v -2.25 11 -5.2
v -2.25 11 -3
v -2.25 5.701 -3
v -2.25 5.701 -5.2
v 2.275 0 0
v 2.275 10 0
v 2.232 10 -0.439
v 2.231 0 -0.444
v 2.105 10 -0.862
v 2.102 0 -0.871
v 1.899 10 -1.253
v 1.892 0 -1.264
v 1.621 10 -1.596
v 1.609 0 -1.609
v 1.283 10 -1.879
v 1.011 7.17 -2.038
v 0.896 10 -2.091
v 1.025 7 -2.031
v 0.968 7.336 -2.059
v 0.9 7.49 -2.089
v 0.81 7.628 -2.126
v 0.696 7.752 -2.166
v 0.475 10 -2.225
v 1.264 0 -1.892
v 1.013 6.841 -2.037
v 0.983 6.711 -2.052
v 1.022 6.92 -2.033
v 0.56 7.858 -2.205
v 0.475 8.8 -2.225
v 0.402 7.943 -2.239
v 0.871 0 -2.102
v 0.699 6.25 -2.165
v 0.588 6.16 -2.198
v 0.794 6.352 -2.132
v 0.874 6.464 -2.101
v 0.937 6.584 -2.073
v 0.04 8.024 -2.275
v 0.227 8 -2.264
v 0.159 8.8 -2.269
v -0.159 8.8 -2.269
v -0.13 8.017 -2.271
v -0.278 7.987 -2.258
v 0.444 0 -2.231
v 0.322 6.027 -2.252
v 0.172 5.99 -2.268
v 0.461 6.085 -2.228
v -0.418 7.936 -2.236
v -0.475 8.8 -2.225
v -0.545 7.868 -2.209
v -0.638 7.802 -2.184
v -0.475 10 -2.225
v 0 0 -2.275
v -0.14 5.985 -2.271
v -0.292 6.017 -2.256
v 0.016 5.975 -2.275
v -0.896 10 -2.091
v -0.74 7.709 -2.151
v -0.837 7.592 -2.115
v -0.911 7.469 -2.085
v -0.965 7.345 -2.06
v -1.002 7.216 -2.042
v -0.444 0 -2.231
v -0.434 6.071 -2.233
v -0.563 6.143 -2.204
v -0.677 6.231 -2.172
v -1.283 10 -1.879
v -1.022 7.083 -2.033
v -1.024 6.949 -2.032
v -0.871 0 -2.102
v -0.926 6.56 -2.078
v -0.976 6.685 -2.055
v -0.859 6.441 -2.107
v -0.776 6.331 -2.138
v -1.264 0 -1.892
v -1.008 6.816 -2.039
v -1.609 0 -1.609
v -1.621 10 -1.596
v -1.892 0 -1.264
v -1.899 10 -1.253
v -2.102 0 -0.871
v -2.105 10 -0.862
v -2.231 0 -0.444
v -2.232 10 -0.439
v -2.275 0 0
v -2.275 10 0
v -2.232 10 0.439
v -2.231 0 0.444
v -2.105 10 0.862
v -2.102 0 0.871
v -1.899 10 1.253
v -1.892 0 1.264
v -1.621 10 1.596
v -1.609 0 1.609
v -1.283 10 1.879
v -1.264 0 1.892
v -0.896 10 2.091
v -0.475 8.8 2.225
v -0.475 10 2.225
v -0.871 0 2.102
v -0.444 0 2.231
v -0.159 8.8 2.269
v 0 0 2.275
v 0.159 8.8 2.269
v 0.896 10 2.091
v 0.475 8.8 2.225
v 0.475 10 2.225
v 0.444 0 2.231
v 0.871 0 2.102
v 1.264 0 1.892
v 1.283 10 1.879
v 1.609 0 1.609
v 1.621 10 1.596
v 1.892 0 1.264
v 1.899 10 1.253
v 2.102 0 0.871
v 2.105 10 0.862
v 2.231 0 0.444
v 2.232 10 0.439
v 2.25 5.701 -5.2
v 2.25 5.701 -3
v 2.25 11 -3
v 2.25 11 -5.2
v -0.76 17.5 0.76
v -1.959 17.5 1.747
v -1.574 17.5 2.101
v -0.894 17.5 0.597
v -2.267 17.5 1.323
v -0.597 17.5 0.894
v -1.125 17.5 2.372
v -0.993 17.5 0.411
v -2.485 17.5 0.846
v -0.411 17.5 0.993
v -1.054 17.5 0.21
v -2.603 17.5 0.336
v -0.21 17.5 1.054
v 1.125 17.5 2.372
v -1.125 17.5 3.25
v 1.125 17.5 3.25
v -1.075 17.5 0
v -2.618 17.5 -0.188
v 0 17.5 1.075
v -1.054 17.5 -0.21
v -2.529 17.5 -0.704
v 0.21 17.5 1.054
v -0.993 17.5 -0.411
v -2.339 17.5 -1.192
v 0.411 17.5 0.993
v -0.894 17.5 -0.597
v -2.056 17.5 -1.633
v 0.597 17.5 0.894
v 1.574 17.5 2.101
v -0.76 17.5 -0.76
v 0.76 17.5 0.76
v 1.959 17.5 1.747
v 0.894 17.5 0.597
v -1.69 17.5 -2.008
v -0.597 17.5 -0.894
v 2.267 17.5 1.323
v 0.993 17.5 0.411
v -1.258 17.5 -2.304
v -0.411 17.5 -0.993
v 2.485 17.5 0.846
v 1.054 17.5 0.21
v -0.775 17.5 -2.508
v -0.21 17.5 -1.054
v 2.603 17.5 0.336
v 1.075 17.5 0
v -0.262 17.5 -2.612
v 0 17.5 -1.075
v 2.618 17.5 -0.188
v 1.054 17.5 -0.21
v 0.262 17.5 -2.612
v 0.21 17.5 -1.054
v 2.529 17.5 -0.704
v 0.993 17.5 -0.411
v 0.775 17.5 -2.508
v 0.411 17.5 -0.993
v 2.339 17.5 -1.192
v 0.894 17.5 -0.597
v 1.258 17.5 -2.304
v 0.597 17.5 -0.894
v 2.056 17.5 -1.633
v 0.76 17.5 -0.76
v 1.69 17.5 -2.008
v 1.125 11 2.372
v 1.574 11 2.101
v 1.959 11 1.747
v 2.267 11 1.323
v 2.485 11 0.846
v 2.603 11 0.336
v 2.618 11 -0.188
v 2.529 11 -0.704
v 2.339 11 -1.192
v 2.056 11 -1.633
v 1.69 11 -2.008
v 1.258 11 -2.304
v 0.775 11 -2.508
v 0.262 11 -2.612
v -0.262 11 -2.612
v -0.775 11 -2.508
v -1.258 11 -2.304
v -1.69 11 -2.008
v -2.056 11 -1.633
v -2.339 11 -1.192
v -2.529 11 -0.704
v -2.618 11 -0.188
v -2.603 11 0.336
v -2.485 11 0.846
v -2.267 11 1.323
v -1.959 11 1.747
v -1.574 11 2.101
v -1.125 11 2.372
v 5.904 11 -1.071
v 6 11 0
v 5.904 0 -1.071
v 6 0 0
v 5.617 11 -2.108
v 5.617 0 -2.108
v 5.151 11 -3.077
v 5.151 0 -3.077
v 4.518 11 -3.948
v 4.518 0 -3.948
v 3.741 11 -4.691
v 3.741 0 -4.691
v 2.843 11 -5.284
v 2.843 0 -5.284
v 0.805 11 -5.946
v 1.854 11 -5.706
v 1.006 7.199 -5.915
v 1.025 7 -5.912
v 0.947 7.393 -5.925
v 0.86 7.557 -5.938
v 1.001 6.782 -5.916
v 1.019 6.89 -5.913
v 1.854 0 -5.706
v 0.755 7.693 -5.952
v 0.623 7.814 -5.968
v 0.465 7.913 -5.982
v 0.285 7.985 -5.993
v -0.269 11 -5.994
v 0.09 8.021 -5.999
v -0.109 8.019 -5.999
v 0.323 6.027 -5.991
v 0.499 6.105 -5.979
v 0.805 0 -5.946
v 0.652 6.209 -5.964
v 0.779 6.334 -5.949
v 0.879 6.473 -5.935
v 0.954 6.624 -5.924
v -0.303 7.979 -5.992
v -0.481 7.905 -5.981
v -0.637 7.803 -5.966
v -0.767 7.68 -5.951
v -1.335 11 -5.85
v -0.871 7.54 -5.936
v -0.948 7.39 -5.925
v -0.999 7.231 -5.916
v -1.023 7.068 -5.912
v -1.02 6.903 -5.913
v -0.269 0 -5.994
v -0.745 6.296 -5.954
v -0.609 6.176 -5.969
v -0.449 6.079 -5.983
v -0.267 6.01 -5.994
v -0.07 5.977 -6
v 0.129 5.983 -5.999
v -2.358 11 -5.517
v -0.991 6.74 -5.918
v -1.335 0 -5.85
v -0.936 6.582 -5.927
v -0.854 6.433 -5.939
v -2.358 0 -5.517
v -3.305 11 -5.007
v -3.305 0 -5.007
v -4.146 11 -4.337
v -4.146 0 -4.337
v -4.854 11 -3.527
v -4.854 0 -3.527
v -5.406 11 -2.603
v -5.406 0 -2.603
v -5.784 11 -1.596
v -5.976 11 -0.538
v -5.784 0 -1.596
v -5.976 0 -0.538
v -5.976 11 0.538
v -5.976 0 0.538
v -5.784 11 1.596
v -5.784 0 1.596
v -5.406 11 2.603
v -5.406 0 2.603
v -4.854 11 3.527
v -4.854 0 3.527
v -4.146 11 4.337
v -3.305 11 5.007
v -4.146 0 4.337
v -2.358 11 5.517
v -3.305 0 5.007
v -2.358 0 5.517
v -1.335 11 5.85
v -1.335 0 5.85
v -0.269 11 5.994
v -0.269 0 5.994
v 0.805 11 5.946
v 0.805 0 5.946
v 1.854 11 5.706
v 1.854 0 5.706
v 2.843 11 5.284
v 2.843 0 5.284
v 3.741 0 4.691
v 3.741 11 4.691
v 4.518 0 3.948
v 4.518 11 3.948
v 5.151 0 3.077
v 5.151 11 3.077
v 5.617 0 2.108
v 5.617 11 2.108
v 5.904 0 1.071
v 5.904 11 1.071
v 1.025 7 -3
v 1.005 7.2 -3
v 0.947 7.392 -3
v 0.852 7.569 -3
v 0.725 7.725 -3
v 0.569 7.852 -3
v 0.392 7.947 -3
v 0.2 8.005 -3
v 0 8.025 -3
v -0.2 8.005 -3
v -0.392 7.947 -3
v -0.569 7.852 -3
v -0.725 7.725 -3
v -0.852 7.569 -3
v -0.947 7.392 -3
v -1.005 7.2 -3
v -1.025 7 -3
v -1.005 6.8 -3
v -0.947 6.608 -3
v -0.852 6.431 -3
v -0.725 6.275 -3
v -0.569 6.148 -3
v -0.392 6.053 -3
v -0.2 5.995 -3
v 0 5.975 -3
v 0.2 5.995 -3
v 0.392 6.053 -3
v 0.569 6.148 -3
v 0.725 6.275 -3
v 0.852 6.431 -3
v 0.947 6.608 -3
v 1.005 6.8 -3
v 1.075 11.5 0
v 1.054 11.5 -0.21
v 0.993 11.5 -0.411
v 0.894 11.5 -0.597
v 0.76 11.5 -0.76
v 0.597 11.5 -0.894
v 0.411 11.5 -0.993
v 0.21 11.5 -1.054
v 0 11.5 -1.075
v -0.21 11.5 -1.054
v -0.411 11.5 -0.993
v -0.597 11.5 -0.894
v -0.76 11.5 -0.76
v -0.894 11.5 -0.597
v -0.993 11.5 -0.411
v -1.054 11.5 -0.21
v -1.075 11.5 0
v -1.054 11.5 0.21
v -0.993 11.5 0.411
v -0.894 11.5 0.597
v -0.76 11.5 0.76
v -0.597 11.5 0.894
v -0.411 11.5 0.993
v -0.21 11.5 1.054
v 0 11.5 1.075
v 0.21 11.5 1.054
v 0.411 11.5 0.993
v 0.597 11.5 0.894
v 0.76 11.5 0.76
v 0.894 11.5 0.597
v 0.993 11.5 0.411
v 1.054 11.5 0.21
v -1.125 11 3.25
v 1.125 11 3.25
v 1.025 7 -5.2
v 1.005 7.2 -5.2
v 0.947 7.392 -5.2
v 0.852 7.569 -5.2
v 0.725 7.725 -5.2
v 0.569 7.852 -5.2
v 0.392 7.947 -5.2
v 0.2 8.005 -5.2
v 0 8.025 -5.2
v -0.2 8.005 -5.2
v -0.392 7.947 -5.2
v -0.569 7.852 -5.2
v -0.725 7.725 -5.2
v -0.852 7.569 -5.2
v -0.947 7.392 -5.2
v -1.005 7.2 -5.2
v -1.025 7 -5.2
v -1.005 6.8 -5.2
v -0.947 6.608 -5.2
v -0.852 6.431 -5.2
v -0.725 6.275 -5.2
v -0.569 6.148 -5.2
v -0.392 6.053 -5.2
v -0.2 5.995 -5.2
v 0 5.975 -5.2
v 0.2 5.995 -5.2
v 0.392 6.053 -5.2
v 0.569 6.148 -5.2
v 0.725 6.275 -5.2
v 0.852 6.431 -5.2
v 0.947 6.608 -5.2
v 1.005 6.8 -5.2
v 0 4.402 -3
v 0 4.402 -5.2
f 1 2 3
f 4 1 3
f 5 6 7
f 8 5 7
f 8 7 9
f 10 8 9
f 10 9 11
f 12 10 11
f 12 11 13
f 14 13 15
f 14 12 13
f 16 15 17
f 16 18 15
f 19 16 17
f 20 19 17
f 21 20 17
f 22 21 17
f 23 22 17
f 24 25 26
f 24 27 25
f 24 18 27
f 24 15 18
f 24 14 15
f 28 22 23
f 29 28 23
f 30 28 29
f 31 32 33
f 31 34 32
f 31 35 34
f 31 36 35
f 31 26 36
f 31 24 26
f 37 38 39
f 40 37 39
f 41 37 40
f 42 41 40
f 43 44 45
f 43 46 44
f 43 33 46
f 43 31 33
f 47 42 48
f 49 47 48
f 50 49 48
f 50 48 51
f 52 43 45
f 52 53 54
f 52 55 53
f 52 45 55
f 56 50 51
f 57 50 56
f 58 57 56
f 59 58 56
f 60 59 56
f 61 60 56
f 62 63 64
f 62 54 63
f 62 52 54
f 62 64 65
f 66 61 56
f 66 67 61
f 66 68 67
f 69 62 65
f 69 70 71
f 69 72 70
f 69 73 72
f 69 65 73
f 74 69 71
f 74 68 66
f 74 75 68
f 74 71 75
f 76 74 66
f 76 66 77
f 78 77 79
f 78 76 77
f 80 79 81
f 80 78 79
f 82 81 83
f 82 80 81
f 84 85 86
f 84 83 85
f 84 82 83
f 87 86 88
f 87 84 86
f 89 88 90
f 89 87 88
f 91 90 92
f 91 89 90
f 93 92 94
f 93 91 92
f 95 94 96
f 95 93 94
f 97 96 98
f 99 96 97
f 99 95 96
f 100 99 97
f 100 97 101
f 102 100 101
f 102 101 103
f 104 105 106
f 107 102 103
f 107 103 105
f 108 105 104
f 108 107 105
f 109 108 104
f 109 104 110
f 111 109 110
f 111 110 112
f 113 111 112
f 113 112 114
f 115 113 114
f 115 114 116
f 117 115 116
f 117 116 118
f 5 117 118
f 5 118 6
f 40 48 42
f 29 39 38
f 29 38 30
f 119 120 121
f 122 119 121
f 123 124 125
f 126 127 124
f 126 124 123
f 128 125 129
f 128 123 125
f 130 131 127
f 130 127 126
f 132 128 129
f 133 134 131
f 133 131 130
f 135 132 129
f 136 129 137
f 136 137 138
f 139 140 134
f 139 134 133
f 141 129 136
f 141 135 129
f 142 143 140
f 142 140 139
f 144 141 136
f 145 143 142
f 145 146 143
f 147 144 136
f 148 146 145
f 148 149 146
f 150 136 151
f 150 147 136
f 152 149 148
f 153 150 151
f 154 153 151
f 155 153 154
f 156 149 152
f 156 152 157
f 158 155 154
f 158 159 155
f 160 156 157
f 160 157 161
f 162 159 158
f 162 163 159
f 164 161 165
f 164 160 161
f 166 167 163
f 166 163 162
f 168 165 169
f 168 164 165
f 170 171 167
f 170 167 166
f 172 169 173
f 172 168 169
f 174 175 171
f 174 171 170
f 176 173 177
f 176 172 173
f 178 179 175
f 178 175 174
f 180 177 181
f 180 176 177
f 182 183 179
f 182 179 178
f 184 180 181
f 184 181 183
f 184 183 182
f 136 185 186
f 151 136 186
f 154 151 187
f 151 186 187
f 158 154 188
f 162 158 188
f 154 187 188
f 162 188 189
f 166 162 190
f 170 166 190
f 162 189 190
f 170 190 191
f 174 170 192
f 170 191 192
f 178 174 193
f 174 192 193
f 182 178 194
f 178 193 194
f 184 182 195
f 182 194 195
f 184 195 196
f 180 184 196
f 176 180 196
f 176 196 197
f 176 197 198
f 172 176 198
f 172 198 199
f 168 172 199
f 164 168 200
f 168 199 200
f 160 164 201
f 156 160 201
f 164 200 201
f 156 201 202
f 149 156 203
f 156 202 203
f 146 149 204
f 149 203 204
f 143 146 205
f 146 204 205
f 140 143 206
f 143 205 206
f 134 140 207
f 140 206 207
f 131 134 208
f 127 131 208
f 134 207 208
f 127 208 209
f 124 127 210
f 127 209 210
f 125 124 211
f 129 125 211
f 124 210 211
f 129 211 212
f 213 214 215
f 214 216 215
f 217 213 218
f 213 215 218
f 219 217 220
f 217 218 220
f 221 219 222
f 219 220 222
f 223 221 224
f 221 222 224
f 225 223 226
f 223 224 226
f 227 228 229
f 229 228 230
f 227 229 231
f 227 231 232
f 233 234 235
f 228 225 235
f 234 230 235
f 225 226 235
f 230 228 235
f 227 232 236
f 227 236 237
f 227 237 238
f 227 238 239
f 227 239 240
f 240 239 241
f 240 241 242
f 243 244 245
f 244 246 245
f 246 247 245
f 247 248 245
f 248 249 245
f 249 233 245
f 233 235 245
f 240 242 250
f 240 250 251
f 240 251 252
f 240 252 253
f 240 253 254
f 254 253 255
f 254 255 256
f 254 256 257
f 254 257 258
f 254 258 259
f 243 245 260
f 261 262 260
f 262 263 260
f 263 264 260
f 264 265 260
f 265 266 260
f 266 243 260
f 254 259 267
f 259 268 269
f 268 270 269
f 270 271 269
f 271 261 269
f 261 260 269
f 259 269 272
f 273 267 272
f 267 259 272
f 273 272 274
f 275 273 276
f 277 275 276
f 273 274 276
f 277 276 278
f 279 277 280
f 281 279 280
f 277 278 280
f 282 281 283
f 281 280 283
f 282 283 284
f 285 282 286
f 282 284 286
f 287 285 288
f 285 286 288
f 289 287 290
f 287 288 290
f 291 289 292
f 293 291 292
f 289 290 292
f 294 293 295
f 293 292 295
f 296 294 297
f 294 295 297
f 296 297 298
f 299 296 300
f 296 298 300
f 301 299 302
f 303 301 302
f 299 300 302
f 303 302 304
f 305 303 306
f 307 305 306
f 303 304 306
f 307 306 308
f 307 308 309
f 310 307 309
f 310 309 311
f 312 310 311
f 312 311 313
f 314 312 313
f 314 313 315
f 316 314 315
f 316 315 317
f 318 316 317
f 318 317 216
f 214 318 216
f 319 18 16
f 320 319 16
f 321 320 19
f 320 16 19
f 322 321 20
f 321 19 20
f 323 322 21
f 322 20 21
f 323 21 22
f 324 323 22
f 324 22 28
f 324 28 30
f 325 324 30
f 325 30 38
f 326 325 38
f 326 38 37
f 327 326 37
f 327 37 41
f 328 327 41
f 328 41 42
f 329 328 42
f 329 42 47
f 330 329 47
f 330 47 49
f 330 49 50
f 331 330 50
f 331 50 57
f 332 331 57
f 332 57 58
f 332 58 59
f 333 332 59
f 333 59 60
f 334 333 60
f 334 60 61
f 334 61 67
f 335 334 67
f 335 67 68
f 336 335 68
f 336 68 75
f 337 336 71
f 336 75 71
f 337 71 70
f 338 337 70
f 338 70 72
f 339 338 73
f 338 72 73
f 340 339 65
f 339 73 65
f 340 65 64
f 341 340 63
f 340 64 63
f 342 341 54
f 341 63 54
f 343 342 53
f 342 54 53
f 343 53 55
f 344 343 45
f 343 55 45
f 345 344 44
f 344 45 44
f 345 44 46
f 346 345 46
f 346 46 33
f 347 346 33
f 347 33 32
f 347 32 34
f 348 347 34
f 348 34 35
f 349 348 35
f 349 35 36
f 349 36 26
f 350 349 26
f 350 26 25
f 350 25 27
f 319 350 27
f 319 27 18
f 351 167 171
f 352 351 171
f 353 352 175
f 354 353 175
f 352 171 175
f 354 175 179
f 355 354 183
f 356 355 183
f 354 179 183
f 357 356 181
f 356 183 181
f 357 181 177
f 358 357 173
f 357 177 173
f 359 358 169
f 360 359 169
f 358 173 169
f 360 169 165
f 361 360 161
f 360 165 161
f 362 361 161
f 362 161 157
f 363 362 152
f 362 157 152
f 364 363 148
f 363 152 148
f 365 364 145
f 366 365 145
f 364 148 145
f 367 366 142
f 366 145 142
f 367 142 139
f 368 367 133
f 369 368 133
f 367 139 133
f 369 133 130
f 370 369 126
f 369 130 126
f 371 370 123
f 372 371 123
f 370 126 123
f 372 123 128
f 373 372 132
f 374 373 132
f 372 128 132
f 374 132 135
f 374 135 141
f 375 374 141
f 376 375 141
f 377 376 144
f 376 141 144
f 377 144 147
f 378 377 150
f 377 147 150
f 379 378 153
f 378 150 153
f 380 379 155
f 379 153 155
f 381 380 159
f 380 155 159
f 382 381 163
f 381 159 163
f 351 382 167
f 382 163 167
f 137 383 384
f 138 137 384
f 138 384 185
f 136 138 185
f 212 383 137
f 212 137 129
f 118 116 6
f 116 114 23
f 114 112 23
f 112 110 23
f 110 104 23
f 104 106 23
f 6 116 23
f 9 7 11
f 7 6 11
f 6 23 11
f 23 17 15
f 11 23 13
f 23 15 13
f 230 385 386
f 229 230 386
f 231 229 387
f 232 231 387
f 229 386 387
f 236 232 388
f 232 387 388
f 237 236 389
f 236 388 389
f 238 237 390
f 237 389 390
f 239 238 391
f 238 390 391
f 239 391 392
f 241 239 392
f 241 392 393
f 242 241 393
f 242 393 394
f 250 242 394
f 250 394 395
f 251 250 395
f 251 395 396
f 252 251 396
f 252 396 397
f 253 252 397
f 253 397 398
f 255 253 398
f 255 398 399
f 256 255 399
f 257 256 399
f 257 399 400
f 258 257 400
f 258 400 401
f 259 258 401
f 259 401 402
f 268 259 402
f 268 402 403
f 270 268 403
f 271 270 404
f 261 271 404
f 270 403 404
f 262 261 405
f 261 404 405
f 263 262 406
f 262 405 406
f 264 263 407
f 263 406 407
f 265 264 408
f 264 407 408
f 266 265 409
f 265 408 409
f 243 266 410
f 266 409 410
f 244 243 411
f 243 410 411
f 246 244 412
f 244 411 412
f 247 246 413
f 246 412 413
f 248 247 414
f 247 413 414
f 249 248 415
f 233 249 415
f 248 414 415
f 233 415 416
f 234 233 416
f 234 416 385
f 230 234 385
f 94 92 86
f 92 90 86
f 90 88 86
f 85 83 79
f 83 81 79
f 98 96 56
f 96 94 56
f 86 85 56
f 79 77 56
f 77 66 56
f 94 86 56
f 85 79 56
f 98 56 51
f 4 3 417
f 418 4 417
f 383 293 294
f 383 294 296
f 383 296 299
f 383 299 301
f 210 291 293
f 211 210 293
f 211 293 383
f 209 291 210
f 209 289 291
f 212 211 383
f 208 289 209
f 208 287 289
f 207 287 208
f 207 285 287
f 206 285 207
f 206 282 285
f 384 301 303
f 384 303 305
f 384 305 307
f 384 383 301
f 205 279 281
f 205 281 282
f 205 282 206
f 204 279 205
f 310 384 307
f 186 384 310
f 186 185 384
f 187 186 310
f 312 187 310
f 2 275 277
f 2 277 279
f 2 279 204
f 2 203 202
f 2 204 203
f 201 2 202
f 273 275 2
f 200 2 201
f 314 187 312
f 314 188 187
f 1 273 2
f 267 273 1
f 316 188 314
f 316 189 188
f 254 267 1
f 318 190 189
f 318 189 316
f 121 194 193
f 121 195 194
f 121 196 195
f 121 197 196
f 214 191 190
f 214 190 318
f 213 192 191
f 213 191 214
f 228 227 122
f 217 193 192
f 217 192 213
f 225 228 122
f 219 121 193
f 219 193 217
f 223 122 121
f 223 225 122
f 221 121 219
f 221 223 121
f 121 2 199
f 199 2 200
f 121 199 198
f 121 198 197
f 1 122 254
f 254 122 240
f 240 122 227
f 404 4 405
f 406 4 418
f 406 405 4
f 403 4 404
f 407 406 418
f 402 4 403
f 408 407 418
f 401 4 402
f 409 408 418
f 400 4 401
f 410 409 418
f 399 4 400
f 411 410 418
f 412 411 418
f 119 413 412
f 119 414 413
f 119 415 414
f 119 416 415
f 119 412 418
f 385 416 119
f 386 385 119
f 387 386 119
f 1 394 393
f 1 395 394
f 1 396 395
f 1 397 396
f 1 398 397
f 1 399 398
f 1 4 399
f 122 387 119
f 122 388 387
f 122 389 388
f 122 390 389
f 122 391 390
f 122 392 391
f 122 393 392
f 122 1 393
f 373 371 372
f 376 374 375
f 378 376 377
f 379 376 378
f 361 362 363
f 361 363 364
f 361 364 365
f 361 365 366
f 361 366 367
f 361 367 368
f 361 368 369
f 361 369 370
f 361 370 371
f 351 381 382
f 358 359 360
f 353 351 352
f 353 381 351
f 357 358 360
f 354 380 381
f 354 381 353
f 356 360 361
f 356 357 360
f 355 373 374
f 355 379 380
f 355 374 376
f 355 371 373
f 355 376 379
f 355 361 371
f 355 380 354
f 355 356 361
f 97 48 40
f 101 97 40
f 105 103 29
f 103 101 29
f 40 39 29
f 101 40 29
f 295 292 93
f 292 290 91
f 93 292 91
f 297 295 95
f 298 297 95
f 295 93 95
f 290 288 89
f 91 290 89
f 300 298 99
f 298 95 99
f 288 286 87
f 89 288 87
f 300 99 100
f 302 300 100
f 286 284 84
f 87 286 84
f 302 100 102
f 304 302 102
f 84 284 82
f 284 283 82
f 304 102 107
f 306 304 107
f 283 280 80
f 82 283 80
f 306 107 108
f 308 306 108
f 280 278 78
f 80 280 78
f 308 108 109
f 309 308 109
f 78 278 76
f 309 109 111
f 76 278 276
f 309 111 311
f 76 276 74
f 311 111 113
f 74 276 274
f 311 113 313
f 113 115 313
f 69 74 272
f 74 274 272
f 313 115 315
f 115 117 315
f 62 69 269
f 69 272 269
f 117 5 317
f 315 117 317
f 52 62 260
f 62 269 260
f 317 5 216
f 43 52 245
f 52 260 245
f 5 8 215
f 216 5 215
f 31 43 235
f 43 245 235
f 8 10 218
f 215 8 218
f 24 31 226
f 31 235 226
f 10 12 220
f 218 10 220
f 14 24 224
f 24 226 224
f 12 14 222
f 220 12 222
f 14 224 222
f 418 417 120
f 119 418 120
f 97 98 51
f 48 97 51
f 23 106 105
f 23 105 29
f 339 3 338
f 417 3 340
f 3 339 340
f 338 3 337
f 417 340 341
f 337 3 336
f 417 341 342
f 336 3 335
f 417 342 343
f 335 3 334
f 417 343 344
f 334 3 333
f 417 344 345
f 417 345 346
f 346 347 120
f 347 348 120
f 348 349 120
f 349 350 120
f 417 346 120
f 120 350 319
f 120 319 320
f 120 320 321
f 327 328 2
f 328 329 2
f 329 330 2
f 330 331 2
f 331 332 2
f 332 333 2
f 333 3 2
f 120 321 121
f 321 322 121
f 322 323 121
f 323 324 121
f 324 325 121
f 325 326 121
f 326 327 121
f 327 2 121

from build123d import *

# Parameters (mm, degrees)
SKETCH1_R           = 6
BOSS_EXTRUDE1_DEPTH = 10
SKETCH2_R           = 1.025
CUT_EXTRUDE1_DEPTH  = 7
SKETCH4_R           = 2.275
CUT_EXTRUDE4_DEPTH  = 11.0000001
SKETCH5_W           = 0.95
SKETCH5_H           = 7.069146706
BOSS_EXTRUDE2_DEPTH = 1.2
SKETCH7_R           = 6
BOSS_EXTRUDE3_DEPTH = 1
SKETCH8_R           = 2.625
SKETCH8_W           = 2.25
SKETCH8_H           = 1.25
BOSS_EXTRUDE4_DEPTH = 6.5
SKETCH9_R           = 1.075
CUT_EXTRUDE5_DEPTH  = 6
CUT_EXTRUDE2_START  = -3
CUT_EXTRUDE2_DEPTH  = 2.2


with BuildPart() as part:
    # Sketch1 → Boss-Extrude1 (new body)
    with BuildSketch(Plane(origin=(0, 0, 0), x_dir=(1, 0, 0), z_dir=(0, 1, 0))):
        Circle(SKETCH1_R)
    extrude(amount=BOSS_EXTRUDE1_DEPTH)

    # Sketch2 → Cut-Extrude1 (cut, through all)
    with BuildSketch(Plane.XY):
        with Locations((0, 7)):
            Circle(SKETCH2_R)
    extrude(amount=-CUT_EXTRUDE1_DEPTH, mode=Mode.SUBTRACT)

    # Sketch4 → Cut-Extrude4 (cut, through all)
    with BuildSketch(Plane(origin=(0, 0, 0), x_dir=(1, 0, 0), z_dir=(0, 1, 0))):
        Circle(SKETCH4_R)
    extrude(amount=CUT_EXTRUDE4_DEPTH, mode=Mode.SUBTRACT)

    # Sketch5 → Boss-Extrude2 (add)
    with BuildSketch(Plane(origin=(0, 10, 0), x_dir=(1, 0, 0), z_dir=(0, 1, 0))):
        Rectangle(SKETCH5_W, SKETCH5_H)
    extrude(amount=-BOSS_EXTRUDE2_DEPTH)

    # Sketch7 → Boss-Extrude3 (add)
    with BuildSketch(Plane(origin=(0, 10, 0), x_dir=(1, 0, 0), z_dir=(0, 1, 0))):
        Circle(SKETCH7_R)
    extrude(amount=BOSS_EXTRUDE3_DEPTH)

    # Sketch8 → Boss-Extrude4 (add)
    with BuildSketch(Plane(origin=(0, 11, 0), x_dir=(1, 0, 0), z_dir=(0, 1, 0))):
        Circle(SKETCH8_R)
        with Locations((0, -2.625)):
            Rectangle(SKETCH8_W, SKETCH8_H)
    extrude(amount=BOSS_EXTRUDE4_DEPTH)

    # Sketch9 → Cut-Extrude5 (cut)
    with BuildSketch(Plane(origin=(0, 17.5, 0), x_dir=(1, 0, 0), z_dir=(0, 1, 0))):
        Circle(SKETCH9_R)
    extrude(amount=-CUT_EXTRUDE5_DEPTH, mode=Mode.SUBTRACT)

    # Sketch3 → Cut-Extrude2 (cut)
    with BuildSketch(Plane.XY.offset(CUT_EXTRUDE2_START)):
        Polygon((0, 4.401923789), (2.25, 5.700961894), (2.25, 8.299038106), (2.25, 11.472802467), (-2.25, 11.472802467), (-2.25, 8.299038106), (-2.25, 5.700961894), align=None)
    extrude(amount=-CUT_EXTRUDE2_DEPTH, mode=Mode.SUBTRACT)


solid = part.part
